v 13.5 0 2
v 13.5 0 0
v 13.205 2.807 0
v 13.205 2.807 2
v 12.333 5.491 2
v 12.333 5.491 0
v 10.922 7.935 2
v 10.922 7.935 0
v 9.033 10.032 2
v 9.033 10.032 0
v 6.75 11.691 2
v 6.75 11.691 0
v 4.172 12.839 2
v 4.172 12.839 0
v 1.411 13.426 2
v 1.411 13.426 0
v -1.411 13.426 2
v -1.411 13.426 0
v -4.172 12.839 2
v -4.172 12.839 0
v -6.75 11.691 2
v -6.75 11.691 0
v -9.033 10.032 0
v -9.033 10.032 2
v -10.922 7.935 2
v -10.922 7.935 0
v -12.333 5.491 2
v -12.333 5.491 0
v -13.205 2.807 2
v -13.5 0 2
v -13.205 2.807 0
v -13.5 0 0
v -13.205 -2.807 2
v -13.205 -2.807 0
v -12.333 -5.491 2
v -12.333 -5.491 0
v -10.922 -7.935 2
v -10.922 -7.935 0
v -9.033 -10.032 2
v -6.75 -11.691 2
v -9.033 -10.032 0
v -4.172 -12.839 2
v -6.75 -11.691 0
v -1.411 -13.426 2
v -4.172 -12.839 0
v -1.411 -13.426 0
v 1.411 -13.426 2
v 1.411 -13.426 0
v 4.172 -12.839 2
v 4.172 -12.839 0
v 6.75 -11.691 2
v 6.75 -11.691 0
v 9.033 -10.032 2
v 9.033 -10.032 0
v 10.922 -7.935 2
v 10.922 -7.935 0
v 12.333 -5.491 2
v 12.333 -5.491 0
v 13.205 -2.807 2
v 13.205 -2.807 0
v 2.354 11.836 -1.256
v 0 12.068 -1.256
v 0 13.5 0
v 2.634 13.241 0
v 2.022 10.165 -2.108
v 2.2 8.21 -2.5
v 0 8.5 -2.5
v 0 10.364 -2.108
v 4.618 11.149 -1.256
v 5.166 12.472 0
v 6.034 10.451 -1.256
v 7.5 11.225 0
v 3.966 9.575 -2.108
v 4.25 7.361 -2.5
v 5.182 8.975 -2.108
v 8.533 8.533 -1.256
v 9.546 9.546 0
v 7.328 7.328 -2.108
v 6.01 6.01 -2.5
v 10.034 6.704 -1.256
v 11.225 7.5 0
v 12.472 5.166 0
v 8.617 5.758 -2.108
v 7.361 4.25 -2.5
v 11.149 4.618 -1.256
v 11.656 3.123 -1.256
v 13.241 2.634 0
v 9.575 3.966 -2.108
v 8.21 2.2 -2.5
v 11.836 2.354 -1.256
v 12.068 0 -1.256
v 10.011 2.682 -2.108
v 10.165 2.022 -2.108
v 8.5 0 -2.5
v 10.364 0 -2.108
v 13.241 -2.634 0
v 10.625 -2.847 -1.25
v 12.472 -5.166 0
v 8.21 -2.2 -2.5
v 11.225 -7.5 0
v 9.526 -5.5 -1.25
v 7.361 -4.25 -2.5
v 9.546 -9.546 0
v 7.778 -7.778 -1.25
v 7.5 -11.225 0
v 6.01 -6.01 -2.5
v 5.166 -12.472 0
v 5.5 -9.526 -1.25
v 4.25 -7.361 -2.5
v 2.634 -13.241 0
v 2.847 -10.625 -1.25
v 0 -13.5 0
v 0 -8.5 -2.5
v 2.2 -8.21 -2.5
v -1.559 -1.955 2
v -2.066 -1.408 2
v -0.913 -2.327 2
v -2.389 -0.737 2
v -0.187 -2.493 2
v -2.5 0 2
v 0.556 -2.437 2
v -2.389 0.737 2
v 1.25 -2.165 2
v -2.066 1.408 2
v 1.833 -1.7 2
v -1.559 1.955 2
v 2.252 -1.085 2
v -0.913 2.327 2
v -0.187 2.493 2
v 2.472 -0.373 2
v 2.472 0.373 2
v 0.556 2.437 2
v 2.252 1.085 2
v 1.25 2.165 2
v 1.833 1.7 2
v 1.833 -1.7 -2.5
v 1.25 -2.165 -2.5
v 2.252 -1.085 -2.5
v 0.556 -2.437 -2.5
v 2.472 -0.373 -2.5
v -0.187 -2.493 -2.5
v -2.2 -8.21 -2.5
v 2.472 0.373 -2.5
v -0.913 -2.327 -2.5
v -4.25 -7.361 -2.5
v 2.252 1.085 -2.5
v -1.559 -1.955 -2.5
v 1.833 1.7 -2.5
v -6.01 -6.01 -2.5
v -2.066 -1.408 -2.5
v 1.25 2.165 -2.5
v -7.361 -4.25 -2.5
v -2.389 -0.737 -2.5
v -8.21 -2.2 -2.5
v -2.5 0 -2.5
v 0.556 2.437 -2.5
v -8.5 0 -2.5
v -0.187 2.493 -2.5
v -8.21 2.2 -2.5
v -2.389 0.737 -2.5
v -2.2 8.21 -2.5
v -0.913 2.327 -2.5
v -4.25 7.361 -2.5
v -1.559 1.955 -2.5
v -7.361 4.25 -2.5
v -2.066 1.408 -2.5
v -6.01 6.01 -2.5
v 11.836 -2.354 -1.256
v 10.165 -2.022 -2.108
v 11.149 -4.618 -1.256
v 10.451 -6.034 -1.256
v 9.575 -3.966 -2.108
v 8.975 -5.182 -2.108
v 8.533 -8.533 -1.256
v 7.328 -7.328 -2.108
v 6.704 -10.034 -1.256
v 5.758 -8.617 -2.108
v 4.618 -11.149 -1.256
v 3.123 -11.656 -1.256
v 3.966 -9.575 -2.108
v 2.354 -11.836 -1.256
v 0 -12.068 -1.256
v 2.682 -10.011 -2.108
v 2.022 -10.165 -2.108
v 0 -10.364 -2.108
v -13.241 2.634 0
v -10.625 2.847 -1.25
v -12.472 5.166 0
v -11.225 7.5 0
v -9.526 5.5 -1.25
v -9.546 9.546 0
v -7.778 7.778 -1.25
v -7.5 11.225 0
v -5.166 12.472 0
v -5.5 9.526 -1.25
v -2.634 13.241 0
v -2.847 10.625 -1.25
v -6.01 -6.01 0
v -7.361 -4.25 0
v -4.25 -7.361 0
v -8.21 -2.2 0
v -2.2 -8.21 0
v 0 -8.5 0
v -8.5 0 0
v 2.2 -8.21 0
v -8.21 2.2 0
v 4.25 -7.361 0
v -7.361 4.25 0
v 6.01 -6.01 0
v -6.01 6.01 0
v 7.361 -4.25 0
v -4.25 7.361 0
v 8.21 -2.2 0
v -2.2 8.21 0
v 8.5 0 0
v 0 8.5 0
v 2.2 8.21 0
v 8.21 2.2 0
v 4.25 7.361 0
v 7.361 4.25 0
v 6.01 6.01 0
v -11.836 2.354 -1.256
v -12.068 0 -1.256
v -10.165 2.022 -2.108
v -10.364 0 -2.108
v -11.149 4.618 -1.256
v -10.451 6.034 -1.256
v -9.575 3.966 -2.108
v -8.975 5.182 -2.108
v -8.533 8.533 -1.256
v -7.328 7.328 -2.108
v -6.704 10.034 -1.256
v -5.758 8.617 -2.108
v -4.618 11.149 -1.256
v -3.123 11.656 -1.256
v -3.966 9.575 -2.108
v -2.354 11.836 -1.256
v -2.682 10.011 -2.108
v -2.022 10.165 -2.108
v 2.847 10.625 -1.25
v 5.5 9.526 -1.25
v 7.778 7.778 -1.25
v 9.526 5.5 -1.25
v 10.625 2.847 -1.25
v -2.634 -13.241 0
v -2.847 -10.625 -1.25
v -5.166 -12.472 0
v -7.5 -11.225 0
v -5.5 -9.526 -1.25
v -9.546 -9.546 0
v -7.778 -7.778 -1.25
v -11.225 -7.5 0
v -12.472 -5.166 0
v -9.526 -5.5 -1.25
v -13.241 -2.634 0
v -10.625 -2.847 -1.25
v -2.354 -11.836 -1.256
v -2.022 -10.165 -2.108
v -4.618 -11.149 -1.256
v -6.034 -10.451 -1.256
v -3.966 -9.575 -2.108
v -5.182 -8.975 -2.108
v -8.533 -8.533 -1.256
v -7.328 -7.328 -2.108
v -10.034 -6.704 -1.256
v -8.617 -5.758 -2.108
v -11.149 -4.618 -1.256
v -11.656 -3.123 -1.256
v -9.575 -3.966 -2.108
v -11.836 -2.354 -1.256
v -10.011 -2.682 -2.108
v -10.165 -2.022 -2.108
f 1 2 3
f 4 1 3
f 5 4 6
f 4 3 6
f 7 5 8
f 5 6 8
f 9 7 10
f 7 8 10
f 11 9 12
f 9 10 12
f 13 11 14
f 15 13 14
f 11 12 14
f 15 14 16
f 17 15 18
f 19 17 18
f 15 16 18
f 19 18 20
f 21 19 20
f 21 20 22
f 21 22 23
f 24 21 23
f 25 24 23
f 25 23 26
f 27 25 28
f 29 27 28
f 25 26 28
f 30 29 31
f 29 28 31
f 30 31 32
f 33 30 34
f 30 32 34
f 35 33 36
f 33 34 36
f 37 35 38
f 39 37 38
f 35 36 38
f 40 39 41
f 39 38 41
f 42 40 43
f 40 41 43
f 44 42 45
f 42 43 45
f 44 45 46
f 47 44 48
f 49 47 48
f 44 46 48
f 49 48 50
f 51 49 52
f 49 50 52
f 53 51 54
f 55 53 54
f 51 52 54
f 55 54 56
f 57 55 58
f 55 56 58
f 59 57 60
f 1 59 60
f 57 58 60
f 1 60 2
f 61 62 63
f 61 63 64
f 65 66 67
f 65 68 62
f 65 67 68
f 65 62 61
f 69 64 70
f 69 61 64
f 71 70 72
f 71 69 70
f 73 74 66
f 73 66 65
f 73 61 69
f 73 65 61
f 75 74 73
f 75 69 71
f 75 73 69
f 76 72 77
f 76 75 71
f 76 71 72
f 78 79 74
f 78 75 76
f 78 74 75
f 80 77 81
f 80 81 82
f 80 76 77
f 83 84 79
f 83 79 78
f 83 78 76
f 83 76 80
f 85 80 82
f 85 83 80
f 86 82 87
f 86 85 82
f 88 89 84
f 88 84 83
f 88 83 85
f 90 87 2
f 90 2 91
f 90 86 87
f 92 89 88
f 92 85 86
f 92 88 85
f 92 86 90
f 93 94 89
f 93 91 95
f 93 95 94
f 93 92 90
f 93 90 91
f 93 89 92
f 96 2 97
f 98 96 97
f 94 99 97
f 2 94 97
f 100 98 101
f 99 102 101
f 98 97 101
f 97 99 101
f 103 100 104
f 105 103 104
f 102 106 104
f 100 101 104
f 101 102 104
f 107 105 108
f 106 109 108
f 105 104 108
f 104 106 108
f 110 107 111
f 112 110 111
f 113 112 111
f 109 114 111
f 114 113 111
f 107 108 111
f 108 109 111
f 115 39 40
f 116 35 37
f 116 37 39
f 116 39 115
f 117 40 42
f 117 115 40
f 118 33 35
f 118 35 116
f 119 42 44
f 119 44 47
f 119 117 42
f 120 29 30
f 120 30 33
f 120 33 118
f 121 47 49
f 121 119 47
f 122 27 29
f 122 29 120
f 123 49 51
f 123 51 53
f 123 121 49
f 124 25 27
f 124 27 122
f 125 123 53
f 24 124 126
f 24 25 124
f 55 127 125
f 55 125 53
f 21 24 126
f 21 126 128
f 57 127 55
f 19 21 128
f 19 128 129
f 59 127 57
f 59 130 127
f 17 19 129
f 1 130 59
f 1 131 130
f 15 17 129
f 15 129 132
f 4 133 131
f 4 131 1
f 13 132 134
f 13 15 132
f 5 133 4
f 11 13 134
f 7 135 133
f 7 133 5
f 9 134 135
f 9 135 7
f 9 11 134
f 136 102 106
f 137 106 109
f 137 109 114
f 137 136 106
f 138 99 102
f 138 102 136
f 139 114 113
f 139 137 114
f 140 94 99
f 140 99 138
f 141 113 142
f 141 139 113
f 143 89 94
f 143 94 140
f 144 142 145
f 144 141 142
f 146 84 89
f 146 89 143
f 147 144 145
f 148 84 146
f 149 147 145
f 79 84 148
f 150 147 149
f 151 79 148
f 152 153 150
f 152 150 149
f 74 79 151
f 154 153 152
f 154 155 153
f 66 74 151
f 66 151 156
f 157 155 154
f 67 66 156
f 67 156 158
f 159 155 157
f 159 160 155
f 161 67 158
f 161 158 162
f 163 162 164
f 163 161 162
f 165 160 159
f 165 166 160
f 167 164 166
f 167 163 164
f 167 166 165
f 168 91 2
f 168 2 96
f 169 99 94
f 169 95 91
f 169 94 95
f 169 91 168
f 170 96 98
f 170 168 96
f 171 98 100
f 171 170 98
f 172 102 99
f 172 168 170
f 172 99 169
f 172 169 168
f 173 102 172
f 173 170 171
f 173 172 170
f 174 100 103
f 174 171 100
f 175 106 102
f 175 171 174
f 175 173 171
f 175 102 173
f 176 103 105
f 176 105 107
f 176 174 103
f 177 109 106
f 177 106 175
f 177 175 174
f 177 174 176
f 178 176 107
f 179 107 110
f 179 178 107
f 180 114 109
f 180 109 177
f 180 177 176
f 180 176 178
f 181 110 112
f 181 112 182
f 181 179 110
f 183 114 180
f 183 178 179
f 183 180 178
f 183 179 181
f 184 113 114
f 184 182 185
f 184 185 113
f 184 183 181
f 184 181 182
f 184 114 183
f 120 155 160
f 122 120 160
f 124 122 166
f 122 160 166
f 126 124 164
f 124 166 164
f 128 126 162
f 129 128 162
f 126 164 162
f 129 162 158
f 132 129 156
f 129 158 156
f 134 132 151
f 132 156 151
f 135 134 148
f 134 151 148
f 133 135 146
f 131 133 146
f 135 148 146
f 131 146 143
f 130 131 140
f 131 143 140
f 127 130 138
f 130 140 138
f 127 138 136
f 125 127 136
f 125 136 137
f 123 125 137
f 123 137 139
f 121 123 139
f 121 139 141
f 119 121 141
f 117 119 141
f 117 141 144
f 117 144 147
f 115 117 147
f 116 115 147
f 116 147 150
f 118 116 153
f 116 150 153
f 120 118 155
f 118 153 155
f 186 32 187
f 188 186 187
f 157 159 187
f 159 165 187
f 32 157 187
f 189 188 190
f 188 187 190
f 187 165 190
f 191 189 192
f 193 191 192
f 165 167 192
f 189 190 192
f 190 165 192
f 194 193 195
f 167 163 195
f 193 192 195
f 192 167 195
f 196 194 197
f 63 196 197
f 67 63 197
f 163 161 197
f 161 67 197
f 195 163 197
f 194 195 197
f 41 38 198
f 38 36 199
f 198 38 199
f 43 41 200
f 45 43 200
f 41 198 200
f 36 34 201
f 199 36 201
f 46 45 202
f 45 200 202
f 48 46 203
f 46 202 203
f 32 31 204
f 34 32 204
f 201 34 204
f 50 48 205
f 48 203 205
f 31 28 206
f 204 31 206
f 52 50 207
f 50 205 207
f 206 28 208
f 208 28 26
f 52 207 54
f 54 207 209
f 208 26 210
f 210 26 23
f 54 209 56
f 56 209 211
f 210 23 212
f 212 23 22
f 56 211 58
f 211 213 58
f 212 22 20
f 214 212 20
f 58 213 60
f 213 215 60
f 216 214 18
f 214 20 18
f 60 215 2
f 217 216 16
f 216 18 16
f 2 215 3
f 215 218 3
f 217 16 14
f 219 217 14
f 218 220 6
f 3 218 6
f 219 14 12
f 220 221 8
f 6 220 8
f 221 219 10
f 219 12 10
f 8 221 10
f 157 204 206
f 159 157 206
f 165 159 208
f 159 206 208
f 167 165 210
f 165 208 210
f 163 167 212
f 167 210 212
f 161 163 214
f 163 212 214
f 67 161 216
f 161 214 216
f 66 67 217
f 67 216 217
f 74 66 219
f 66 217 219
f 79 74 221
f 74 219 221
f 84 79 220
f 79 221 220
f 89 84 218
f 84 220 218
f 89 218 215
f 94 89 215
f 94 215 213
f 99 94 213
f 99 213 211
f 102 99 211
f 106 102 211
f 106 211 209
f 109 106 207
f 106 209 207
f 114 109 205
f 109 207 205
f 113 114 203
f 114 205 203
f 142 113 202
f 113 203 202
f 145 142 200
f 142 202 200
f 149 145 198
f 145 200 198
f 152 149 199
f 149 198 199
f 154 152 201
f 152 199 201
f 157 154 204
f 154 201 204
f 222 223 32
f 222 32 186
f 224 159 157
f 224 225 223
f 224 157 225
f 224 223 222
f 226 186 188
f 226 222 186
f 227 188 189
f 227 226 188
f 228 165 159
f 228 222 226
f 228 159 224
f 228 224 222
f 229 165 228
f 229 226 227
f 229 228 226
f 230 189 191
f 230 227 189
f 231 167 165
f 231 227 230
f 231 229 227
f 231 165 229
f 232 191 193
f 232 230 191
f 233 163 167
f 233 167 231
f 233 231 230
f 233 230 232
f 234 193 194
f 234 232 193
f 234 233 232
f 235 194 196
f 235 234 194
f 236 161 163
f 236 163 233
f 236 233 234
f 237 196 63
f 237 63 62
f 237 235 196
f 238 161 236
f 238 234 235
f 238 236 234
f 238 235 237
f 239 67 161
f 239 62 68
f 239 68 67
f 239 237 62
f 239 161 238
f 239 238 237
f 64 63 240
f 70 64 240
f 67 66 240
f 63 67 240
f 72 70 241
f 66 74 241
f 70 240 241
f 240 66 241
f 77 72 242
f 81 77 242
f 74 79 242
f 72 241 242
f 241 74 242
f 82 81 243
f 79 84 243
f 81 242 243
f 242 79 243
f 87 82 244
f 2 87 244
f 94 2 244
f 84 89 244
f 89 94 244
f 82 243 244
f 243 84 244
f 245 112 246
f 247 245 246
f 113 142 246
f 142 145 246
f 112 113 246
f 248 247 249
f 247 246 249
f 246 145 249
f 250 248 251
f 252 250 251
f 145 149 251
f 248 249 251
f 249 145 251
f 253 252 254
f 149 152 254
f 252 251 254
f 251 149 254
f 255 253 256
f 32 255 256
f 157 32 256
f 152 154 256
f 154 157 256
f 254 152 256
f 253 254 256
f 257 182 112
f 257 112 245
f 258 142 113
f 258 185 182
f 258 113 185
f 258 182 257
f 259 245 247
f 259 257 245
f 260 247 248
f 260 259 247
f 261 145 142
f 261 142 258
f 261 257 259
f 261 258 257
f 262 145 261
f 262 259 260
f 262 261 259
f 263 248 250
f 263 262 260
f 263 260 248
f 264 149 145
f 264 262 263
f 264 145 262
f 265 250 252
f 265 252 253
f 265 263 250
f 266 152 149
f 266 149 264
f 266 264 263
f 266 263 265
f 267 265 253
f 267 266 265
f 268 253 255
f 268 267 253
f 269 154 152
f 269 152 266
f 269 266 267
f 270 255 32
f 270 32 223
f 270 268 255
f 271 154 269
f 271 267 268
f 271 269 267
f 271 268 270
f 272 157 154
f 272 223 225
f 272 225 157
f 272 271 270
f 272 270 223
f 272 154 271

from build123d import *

# Parameters (mm, degrees)
SKETCH_1_R          = 13.5
EXTRUDE_1_DEPTH     = 2
SKETCH_3_R          = 8.5
EXTRUDE_2_DEPTH     = 2.5
SKETCH_7_R          = 2.5
CUT_EXTRUDE_1_DEPTH = 4.5


with BuildPart() as part:
    # 草图1 → 凸台-拉伸1 (new body)
    with BuildSketch(Plane.XY):
        Circle(SKETCH_1_R)
    extrude(amount=EXTRUDE_1_DEPTH)

    # 草图3 → 凸台-拉伸2 (add)
    with BuildSketch(Plane(origin=(0, 0, 0), x_dir=(-1, 0, 0), z_dir=(0, 0, -1))):
        Circle(SKETCH_3_R)
    extrude(amount=EXTRUDE_2_DEPTH)

    # 草图7 → 切除-拉伸1 (cut)
    with BuildSketch(Plane(origin=(0, 0, -2.5), x_dir=(-1, 0, 0), z_dir=(0, 0, -1))):
        Circle(SKETCH_7_R)
    extrude(amount=-CUT_EXTRUDE_1_DEPTH, mode=Mode.SUBTRACT)


with BuildPart() as body_2:
    # 扫描1: sweep along a curve in space
    with BuildLine() as sweep_1_path:
        ThreePointArc((-8.5, 0, -2.5), (-6.01040764, 6.01040764, -2.5), (0, 8.5, -2.5))
        ThreePointArc((0, 8.5, -2.5), (6.01040764, 6.01040764, -2.5), (8.5, 0, -2.5))
        ThreePointArc((8.5, 0, -2.5), (6.01040764, -6.01040764, -2.5), (0, -8.5, -2.5))
        ThreePointArc((0, -8.5, -2.5), (-6.01040764, -6.01040764, -2.5), (-8.5, 0, -2.5))
    # 草图4 → 扫描1 (sweep)
    with BuildSketch(Plane(origin=(0, 0, 0), x_dir=(1, 0, 0), z_dir=(0, 1, 0))):
        with BuildLine():
            Line((-13.5, 0), (-8.5, 2.5))
            ThreePointArc((-8.5, 2.5), (-11.243106023, 1.736212046), (-13.5, 0))
        make_face()
    sweep(path=sweep_1_path.line)


solid = Compound([part.part, body_2.part])
